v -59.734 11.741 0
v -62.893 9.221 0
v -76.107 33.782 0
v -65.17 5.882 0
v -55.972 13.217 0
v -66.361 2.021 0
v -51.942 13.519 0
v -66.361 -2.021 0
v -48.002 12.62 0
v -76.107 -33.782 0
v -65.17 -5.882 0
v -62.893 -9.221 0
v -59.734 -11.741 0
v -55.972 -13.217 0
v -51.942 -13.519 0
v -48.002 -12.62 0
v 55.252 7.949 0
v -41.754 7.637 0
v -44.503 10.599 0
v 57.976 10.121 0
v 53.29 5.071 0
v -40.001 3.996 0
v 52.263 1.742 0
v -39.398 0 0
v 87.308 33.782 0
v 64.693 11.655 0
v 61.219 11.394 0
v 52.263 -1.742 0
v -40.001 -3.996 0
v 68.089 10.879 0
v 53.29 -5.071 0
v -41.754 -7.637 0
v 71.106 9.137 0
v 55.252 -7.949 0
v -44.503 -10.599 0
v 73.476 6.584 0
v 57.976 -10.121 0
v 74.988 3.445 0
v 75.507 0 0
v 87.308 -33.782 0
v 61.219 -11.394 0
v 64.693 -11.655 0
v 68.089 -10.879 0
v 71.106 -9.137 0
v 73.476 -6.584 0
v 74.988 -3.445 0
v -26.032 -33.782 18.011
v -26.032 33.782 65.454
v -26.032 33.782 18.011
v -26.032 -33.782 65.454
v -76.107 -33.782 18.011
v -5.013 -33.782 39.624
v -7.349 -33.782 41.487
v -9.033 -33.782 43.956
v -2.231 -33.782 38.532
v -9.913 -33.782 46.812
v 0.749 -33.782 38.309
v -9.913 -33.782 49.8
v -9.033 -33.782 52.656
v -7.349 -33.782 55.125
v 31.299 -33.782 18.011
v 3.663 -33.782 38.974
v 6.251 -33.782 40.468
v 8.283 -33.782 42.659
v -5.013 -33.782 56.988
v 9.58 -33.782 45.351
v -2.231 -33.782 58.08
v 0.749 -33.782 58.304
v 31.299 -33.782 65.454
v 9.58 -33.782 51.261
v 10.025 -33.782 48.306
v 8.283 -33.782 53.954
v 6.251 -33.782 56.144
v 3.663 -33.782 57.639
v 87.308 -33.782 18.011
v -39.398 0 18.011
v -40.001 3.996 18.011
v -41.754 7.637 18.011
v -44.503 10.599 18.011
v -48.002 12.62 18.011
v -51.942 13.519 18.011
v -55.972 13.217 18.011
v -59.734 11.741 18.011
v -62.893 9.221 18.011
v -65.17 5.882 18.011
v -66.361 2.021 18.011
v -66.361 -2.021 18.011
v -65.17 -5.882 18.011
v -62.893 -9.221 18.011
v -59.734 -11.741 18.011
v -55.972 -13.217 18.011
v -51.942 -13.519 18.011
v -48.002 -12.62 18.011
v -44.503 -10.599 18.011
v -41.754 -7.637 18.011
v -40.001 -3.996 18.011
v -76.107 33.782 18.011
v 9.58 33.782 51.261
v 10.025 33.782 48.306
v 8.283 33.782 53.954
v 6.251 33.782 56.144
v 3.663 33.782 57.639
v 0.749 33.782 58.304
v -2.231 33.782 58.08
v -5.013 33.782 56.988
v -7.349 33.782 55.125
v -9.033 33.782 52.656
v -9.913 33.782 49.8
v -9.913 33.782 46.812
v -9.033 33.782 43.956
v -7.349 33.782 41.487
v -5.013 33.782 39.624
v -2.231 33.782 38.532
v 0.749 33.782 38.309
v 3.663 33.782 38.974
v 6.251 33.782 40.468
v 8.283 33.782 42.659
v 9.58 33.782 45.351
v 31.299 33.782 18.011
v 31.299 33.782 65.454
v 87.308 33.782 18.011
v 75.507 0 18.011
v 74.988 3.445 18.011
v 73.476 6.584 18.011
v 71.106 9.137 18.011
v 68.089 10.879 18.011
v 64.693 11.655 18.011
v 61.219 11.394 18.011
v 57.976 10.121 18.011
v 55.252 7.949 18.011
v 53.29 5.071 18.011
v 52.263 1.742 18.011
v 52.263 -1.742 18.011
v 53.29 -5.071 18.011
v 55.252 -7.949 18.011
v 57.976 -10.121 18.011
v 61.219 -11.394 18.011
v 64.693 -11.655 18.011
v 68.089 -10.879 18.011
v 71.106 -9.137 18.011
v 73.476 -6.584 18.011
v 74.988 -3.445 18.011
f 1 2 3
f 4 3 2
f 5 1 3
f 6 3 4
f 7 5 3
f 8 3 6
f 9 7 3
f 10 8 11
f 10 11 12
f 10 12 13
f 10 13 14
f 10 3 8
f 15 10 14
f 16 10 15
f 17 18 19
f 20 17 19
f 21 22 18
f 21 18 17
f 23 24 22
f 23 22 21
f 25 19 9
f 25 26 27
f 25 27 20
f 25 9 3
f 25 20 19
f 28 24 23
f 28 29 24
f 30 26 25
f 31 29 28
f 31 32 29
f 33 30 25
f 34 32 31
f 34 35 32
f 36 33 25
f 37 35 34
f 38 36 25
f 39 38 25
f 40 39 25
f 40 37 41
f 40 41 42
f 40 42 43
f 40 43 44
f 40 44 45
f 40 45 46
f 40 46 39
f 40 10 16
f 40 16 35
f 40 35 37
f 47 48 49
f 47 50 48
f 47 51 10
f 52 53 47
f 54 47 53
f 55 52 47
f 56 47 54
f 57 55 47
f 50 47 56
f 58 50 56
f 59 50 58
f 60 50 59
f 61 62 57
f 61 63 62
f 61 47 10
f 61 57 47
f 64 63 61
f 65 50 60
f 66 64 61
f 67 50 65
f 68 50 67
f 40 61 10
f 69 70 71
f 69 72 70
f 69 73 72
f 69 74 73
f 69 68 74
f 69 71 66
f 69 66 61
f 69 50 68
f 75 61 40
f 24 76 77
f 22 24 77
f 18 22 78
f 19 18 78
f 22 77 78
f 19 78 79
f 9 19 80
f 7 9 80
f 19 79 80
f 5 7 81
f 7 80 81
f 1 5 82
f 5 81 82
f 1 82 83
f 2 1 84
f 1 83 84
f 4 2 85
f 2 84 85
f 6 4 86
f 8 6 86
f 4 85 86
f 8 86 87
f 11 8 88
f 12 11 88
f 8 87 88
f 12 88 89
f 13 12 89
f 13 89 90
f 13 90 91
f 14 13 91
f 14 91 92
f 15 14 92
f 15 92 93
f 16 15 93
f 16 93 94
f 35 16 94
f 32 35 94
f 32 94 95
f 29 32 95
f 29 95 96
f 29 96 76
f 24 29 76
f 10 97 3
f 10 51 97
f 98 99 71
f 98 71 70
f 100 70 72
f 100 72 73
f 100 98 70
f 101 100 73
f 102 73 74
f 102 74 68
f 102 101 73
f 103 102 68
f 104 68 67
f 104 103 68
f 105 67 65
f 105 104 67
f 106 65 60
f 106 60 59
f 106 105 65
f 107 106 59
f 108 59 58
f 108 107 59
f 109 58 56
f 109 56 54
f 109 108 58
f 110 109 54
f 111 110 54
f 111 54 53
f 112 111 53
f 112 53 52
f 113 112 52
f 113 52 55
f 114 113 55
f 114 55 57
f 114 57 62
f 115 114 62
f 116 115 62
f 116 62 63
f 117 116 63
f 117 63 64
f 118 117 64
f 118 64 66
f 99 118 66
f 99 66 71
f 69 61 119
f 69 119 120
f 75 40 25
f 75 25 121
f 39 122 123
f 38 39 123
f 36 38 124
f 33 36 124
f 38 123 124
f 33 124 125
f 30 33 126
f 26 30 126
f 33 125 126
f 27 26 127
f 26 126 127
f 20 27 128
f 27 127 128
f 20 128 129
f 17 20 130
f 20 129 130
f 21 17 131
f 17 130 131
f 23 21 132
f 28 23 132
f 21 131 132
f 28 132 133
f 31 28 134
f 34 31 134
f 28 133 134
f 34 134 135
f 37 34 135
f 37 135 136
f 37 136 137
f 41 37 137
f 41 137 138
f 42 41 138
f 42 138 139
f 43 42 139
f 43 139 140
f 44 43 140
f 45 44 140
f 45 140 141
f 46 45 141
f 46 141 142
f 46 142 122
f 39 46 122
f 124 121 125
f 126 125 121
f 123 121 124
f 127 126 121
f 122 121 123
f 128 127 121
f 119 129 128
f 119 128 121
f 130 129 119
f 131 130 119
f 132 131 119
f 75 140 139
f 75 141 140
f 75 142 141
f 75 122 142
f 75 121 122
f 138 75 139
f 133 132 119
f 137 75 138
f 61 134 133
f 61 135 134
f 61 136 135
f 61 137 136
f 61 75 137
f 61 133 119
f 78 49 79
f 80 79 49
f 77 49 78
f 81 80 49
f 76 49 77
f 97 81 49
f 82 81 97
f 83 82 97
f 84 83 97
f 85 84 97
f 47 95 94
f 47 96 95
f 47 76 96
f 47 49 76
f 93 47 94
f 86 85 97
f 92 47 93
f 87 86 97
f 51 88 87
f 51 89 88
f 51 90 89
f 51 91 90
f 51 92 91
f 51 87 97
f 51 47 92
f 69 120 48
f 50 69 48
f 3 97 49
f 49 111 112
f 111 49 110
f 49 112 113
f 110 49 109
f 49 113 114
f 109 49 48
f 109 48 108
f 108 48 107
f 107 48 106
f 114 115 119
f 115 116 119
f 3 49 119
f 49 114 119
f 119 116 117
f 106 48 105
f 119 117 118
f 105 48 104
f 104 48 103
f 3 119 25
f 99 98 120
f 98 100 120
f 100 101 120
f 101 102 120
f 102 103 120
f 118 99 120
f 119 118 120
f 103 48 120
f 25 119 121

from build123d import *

# Parameters (mm, degrees)
F0_R     = 10.025371
F1_DEPTH = 33.782
F2_DEPTH = 25.4
F3_R     = 13.556972
F3_R_2   = 11.687206
F4_DEPTH = 25.4
F5_DEPTH = 25.4


with BuildPart() as f1:
    # F0 (on Front) → F1 (new body, symmetric)
    with BuildSketch(Plane.XZ):
        Polygon((-76.107018, 18.011289), (-76.107018, 0), (87.307796, 0), (87.307796, 18.011289), (31.29869, 18.011289), (31.29869, 65.454304), (-26.03207, 65.454304), (-26.03207, 18.011289), align=None)
        with Locations((0, 48.306234)):
            Circle(F0_R, mode=Mode.SUBTRACT)
    extrude(amount=F1_DEPTH, both=True)

    # F0 (on Front) → F2 (join)
    with BuildSketch(Plane.XZ):
        Polygon((-76.107018, 18.011289), (-76.107018, 0), (87.307796, 0), (87.307796, 18.011289), (31.29869, 18.011289), (31.29869, 65.454304), (-26.03207, 65.454304), (-26.03207, 18.011289), align=None)
        with Locations((0, 48.306234)):
            Circle(F0_R, mode=Mode.SUBTRACT)
    extrude(amount=F2_DEPTH)

    # F3 (on face) → F4 (cut)
    with BuildSketch(Plane.XY.offset(18.011289)):
        with Locations((-52.955225, 0)):
            Circle(F3_R)
        with Locations((63.819543, 0)):
            Circle(F3_R_2)
    extrude(amount=-F4_DEPTH, mode=Mode.SUBTRACT)

    # F3 (on face) → F5 (cut)
    with BuildSketch(Plane.XY.offset(18.011289)):
        with Locations((-52.955225, 0)):
            Circle(F3_R)
        with Locations((63.819543, 0)):
            Circle(F3_R_2)
    extrude(amount=-F5_DEPTH, mode=Mode.SUBTRACT)


solid = f1.part
